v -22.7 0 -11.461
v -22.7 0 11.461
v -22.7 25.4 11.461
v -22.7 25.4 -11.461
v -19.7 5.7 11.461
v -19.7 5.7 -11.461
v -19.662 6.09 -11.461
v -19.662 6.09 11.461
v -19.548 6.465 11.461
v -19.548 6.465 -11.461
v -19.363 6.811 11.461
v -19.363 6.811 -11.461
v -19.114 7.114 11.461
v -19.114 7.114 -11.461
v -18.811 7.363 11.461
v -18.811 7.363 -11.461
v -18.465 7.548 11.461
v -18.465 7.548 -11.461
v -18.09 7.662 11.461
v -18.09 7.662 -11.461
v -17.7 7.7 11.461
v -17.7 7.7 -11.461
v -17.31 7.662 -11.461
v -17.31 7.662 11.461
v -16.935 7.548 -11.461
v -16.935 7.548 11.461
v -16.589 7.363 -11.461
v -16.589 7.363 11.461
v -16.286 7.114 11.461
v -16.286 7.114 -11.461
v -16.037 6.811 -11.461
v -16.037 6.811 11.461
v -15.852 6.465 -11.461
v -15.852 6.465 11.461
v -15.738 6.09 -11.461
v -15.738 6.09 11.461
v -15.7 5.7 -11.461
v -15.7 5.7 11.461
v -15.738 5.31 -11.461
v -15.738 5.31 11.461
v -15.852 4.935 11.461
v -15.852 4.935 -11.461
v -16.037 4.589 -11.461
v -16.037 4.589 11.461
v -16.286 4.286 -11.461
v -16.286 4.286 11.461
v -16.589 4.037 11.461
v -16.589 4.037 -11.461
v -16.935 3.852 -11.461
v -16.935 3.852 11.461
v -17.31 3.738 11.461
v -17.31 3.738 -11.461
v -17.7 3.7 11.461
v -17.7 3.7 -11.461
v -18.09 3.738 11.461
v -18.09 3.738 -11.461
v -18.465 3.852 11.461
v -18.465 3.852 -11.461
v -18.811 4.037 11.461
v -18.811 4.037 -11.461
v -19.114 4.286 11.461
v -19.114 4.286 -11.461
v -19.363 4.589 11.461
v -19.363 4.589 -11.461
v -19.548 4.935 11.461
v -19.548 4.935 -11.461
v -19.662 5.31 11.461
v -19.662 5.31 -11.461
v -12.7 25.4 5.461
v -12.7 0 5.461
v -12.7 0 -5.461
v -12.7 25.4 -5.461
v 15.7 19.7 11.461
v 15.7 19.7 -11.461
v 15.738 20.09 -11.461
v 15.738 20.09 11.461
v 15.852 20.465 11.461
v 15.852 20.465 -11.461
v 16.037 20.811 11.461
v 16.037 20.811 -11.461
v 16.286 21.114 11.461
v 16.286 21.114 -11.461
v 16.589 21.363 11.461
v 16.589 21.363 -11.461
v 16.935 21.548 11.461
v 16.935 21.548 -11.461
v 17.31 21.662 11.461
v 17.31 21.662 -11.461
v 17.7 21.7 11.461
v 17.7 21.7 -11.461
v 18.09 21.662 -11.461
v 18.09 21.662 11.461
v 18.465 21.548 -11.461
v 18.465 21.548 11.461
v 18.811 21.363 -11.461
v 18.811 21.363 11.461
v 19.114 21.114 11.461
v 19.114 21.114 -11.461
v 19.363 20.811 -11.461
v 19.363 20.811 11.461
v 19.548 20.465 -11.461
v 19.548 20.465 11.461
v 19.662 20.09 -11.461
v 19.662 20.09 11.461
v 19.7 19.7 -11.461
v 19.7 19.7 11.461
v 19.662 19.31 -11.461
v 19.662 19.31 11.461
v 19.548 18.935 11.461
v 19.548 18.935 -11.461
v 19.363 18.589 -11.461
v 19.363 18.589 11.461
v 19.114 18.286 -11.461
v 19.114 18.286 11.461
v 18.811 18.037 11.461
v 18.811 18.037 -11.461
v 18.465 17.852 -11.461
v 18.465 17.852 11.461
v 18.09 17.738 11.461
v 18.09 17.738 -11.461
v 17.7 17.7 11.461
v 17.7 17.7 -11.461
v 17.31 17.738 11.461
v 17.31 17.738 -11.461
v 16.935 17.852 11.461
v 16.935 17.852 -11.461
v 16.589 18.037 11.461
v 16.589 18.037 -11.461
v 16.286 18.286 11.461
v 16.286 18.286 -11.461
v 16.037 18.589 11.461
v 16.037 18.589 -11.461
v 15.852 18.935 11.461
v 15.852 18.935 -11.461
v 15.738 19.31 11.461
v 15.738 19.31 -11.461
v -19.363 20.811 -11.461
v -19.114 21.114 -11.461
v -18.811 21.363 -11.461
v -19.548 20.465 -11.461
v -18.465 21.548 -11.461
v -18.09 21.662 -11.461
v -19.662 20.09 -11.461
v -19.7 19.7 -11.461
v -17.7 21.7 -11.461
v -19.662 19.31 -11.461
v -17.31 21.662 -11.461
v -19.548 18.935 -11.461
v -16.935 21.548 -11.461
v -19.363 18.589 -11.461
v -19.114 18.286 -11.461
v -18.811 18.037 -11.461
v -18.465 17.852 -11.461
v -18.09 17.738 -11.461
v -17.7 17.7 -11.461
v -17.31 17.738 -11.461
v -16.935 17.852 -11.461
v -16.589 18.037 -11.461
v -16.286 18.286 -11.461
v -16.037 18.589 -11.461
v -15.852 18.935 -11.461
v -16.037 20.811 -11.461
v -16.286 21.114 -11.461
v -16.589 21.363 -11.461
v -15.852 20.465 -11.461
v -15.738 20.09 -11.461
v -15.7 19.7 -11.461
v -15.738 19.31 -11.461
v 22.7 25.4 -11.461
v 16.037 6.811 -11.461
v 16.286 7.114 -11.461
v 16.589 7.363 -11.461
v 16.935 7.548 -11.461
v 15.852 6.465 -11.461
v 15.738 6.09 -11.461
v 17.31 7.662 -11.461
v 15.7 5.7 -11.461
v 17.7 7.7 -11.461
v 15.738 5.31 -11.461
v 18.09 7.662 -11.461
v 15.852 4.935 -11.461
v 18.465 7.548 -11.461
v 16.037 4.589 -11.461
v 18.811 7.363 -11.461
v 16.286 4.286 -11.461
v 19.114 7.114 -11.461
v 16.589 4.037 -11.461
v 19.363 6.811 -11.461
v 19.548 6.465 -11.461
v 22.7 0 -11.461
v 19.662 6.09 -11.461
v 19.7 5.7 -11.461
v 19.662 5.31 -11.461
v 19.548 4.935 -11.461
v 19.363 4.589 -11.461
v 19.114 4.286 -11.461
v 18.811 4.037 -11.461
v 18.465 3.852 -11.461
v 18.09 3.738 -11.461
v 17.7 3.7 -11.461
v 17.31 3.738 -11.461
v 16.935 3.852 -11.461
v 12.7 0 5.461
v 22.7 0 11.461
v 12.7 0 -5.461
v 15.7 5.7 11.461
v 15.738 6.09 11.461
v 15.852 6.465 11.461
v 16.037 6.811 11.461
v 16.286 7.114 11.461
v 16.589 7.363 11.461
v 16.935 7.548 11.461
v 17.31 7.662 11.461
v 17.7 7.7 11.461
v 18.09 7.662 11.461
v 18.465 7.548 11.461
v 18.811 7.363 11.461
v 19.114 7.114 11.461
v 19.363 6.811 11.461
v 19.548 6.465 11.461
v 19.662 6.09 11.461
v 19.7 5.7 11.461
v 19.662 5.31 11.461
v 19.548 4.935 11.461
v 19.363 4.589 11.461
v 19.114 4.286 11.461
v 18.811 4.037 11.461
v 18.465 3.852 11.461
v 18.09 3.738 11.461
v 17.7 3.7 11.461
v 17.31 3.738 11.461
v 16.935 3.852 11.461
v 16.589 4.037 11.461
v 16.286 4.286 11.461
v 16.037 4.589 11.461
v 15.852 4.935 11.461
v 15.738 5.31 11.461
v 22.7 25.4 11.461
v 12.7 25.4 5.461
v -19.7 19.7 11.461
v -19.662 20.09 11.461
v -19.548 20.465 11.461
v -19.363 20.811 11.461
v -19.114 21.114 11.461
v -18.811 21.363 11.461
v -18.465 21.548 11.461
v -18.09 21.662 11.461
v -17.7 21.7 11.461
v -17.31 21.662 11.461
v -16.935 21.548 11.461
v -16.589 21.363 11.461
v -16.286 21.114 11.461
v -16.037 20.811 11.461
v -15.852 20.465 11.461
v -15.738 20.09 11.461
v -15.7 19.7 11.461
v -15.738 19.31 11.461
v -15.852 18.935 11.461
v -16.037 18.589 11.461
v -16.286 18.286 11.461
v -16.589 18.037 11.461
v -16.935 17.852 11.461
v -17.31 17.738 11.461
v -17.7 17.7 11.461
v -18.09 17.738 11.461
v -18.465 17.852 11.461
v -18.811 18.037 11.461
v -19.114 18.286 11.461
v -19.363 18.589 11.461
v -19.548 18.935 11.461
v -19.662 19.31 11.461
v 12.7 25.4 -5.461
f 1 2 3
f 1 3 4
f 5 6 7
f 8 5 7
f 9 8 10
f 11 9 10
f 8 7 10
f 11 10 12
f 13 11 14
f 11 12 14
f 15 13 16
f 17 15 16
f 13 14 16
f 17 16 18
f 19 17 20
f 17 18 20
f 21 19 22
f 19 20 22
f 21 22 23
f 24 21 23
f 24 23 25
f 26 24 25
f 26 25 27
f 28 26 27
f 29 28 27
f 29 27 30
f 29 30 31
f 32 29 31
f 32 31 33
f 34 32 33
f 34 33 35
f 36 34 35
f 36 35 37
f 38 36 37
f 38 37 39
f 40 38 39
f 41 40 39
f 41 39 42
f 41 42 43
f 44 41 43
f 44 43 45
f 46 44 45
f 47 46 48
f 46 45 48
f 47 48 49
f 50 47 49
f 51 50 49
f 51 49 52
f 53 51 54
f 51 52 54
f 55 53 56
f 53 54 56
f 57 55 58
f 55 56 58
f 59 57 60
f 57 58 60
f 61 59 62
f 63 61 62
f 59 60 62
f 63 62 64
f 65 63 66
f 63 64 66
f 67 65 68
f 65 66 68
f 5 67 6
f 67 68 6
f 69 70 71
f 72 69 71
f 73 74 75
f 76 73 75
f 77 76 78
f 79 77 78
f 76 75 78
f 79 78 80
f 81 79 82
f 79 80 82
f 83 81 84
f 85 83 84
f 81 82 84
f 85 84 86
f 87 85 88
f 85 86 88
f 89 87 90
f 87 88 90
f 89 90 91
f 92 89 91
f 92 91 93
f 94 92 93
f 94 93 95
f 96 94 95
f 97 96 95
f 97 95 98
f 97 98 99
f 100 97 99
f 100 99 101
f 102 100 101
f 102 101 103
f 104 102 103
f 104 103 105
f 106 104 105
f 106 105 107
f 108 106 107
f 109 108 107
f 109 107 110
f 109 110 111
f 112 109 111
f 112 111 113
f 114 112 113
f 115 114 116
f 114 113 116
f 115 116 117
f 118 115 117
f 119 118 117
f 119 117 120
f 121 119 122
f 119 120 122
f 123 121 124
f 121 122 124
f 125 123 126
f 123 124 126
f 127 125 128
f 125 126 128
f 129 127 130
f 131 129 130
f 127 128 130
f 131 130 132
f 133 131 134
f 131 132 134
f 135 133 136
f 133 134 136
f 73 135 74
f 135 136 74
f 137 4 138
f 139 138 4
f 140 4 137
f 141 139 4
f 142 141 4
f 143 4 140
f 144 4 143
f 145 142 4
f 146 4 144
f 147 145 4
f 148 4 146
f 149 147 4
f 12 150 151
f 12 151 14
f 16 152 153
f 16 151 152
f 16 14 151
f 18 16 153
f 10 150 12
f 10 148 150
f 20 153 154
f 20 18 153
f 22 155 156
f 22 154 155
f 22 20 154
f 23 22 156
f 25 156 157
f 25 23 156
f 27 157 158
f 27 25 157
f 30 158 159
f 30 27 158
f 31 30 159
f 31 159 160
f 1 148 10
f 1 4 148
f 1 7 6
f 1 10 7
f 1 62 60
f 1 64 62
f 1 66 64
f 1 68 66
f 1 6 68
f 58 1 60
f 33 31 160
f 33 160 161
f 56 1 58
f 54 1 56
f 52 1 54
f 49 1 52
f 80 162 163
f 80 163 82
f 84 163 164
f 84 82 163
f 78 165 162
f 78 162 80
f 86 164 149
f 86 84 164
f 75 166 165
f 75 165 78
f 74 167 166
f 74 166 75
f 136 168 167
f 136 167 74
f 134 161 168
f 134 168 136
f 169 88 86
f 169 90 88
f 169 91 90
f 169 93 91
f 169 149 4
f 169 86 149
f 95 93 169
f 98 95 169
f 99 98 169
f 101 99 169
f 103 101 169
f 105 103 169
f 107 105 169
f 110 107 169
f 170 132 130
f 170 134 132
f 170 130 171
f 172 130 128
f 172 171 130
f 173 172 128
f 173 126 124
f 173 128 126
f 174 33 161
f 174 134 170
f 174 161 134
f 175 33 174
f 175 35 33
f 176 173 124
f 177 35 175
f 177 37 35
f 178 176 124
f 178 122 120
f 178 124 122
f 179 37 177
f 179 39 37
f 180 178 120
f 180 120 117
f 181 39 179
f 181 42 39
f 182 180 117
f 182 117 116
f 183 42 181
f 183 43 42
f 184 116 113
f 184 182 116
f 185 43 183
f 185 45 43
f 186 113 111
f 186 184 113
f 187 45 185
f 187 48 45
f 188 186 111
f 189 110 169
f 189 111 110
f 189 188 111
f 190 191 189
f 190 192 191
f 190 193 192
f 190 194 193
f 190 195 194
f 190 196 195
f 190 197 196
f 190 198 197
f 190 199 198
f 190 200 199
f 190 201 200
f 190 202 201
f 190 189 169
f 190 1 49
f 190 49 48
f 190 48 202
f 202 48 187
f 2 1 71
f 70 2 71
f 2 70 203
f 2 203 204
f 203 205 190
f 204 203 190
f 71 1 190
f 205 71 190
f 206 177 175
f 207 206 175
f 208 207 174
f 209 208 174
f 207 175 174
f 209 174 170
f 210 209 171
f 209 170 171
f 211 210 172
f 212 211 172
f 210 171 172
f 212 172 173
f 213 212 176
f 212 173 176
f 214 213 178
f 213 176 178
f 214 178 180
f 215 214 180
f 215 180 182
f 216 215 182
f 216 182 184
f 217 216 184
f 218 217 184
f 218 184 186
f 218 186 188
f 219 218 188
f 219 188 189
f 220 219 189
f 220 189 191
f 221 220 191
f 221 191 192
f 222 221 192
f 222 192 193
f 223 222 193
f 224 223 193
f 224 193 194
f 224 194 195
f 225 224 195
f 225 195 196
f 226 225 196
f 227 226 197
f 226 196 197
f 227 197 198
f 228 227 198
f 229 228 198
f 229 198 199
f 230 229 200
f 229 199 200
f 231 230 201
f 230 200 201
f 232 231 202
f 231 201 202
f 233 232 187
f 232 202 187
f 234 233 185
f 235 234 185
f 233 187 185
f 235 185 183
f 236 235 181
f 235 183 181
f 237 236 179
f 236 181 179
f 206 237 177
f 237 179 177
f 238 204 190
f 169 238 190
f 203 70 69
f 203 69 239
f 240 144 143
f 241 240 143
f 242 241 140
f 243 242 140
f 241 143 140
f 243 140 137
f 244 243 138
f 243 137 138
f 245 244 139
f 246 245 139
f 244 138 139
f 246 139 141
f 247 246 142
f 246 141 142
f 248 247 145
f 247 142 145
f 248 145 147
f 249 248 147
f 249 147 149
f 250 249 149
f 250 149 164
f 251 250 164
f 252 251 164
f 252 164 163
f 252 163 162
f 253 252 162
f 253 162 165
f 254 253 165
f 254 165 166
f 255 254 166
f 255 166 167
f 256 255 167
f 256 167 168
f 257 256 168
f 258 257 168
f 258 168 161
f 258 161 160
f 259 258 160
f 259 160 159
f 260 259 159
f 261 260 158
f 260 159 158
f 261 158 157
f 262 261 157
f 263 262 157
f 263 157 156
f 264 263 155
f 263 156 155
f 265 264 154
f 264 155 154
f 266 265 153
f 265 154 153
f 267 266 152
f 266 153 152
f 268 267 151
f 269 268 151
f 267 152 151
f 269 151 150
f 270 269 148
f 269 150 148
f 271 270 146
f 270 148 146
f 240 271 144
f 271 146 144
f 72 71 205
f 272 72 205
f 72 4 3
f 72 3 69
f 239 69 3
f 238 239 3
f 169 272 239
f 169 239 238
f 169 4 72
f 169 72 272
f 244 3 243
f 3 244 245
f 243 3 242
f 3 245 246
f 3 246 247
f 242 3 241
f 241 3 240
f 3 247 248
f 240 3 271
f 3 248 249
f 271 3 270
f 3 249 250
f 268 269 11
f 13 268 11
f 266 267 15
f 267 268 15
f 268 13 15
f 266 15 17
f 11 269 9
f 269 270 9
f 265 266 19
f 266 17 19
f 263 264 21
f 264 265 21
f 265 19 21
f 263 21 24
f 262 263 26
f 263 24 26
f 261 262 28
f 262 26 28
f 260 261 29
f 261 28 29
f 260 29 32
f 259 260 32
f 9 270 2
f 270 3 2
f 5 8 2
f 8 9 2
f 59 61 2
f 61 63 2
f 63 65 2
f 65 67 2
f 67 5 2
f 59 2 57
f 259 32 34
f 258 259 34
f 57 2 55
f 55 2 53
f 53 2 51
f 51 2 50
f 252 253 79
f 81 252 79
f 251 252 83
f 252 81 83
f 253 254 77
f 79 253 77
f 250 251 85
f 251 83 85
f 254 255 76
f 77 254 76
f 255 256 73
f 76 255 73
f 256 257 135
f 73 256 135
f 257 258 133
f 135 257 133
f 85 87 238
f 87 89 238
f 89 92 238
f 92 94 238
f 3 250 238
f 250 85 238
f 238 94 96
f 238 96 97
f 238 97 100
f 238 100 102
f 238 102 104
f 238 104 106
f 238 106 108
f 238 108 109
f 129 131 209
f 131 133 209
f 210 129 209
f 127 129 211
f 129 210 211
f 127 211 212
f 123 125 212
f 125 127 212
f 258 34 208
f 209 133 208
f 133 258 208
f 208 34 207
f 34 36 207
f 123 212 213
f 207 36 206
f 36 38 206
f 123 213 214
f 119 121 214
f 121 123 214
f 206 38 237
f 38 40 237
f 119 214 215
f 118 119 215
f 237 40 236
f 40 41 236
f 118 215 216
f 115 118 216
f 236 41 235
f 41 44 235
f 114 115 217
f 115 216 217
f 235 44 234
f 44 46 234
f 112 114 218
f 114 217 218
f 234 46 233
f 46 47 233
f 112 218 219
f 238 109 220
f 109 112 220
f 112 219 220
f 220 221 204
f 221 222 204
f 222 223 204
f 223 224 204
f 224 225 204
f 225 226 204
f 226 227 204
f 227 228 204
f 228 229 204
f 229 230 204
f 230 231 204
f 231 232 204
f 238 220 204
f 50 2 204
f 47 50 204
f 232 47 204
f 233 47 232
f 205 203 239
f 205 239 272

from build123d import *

# Parameters (mm, degrees)
SKETCH1_W           = 45.4
SKETCH1_H           = 22.922
SKETCH1_W_2         = 25.4
SKETCH1_H_2         = 10.922
BOSS_EXTRUDE1_DEPTH = 25.4
SKETCH2_R           = 2
CUT_EXTRUDE1_DEPTH  = 23.922


with BuildPart() as part:
    # Sketch1 → Boss-Extrude1 (new body)
    with BuildSketch(Plane(origin=(0, 0, 0), x_dir=(1, 0, 0), z_dir=(0, 1, 0))):
        Rectangle(SKETCH1_W, SKETCH1_H)
        Rectangle(SKETCH1_W_2, SKETCH1_H_2, mode=Mode.SUBTRACT)
    extrude(amount=BOSS_EXTRUDE1_DEPTH)

    # Sketch2 → Cut-Extrude1 (cut, through all)
    with BuildSketch(Plane(origin=(0, 0, -11.461), x_dir=(-1, 0, 0), z_dir=(0, 0, -1))):
        with Locations((-17.7, 5.7)):
            Circle(SKETCH2_R)
        with Locations((-17.7, 19.7)):
            Circle(SKETCH2_R)
        with Locations((17.7, 19.7)):
            Circle(SKETCH2_R)
        with Locations((17.7, 5.7)):
            Circle(SKETCH2_R)
    extrude(amount=-CUT_EXTRUDE1_DEPTH, mode=Mode.SUBTRACT)


solid = part.part
